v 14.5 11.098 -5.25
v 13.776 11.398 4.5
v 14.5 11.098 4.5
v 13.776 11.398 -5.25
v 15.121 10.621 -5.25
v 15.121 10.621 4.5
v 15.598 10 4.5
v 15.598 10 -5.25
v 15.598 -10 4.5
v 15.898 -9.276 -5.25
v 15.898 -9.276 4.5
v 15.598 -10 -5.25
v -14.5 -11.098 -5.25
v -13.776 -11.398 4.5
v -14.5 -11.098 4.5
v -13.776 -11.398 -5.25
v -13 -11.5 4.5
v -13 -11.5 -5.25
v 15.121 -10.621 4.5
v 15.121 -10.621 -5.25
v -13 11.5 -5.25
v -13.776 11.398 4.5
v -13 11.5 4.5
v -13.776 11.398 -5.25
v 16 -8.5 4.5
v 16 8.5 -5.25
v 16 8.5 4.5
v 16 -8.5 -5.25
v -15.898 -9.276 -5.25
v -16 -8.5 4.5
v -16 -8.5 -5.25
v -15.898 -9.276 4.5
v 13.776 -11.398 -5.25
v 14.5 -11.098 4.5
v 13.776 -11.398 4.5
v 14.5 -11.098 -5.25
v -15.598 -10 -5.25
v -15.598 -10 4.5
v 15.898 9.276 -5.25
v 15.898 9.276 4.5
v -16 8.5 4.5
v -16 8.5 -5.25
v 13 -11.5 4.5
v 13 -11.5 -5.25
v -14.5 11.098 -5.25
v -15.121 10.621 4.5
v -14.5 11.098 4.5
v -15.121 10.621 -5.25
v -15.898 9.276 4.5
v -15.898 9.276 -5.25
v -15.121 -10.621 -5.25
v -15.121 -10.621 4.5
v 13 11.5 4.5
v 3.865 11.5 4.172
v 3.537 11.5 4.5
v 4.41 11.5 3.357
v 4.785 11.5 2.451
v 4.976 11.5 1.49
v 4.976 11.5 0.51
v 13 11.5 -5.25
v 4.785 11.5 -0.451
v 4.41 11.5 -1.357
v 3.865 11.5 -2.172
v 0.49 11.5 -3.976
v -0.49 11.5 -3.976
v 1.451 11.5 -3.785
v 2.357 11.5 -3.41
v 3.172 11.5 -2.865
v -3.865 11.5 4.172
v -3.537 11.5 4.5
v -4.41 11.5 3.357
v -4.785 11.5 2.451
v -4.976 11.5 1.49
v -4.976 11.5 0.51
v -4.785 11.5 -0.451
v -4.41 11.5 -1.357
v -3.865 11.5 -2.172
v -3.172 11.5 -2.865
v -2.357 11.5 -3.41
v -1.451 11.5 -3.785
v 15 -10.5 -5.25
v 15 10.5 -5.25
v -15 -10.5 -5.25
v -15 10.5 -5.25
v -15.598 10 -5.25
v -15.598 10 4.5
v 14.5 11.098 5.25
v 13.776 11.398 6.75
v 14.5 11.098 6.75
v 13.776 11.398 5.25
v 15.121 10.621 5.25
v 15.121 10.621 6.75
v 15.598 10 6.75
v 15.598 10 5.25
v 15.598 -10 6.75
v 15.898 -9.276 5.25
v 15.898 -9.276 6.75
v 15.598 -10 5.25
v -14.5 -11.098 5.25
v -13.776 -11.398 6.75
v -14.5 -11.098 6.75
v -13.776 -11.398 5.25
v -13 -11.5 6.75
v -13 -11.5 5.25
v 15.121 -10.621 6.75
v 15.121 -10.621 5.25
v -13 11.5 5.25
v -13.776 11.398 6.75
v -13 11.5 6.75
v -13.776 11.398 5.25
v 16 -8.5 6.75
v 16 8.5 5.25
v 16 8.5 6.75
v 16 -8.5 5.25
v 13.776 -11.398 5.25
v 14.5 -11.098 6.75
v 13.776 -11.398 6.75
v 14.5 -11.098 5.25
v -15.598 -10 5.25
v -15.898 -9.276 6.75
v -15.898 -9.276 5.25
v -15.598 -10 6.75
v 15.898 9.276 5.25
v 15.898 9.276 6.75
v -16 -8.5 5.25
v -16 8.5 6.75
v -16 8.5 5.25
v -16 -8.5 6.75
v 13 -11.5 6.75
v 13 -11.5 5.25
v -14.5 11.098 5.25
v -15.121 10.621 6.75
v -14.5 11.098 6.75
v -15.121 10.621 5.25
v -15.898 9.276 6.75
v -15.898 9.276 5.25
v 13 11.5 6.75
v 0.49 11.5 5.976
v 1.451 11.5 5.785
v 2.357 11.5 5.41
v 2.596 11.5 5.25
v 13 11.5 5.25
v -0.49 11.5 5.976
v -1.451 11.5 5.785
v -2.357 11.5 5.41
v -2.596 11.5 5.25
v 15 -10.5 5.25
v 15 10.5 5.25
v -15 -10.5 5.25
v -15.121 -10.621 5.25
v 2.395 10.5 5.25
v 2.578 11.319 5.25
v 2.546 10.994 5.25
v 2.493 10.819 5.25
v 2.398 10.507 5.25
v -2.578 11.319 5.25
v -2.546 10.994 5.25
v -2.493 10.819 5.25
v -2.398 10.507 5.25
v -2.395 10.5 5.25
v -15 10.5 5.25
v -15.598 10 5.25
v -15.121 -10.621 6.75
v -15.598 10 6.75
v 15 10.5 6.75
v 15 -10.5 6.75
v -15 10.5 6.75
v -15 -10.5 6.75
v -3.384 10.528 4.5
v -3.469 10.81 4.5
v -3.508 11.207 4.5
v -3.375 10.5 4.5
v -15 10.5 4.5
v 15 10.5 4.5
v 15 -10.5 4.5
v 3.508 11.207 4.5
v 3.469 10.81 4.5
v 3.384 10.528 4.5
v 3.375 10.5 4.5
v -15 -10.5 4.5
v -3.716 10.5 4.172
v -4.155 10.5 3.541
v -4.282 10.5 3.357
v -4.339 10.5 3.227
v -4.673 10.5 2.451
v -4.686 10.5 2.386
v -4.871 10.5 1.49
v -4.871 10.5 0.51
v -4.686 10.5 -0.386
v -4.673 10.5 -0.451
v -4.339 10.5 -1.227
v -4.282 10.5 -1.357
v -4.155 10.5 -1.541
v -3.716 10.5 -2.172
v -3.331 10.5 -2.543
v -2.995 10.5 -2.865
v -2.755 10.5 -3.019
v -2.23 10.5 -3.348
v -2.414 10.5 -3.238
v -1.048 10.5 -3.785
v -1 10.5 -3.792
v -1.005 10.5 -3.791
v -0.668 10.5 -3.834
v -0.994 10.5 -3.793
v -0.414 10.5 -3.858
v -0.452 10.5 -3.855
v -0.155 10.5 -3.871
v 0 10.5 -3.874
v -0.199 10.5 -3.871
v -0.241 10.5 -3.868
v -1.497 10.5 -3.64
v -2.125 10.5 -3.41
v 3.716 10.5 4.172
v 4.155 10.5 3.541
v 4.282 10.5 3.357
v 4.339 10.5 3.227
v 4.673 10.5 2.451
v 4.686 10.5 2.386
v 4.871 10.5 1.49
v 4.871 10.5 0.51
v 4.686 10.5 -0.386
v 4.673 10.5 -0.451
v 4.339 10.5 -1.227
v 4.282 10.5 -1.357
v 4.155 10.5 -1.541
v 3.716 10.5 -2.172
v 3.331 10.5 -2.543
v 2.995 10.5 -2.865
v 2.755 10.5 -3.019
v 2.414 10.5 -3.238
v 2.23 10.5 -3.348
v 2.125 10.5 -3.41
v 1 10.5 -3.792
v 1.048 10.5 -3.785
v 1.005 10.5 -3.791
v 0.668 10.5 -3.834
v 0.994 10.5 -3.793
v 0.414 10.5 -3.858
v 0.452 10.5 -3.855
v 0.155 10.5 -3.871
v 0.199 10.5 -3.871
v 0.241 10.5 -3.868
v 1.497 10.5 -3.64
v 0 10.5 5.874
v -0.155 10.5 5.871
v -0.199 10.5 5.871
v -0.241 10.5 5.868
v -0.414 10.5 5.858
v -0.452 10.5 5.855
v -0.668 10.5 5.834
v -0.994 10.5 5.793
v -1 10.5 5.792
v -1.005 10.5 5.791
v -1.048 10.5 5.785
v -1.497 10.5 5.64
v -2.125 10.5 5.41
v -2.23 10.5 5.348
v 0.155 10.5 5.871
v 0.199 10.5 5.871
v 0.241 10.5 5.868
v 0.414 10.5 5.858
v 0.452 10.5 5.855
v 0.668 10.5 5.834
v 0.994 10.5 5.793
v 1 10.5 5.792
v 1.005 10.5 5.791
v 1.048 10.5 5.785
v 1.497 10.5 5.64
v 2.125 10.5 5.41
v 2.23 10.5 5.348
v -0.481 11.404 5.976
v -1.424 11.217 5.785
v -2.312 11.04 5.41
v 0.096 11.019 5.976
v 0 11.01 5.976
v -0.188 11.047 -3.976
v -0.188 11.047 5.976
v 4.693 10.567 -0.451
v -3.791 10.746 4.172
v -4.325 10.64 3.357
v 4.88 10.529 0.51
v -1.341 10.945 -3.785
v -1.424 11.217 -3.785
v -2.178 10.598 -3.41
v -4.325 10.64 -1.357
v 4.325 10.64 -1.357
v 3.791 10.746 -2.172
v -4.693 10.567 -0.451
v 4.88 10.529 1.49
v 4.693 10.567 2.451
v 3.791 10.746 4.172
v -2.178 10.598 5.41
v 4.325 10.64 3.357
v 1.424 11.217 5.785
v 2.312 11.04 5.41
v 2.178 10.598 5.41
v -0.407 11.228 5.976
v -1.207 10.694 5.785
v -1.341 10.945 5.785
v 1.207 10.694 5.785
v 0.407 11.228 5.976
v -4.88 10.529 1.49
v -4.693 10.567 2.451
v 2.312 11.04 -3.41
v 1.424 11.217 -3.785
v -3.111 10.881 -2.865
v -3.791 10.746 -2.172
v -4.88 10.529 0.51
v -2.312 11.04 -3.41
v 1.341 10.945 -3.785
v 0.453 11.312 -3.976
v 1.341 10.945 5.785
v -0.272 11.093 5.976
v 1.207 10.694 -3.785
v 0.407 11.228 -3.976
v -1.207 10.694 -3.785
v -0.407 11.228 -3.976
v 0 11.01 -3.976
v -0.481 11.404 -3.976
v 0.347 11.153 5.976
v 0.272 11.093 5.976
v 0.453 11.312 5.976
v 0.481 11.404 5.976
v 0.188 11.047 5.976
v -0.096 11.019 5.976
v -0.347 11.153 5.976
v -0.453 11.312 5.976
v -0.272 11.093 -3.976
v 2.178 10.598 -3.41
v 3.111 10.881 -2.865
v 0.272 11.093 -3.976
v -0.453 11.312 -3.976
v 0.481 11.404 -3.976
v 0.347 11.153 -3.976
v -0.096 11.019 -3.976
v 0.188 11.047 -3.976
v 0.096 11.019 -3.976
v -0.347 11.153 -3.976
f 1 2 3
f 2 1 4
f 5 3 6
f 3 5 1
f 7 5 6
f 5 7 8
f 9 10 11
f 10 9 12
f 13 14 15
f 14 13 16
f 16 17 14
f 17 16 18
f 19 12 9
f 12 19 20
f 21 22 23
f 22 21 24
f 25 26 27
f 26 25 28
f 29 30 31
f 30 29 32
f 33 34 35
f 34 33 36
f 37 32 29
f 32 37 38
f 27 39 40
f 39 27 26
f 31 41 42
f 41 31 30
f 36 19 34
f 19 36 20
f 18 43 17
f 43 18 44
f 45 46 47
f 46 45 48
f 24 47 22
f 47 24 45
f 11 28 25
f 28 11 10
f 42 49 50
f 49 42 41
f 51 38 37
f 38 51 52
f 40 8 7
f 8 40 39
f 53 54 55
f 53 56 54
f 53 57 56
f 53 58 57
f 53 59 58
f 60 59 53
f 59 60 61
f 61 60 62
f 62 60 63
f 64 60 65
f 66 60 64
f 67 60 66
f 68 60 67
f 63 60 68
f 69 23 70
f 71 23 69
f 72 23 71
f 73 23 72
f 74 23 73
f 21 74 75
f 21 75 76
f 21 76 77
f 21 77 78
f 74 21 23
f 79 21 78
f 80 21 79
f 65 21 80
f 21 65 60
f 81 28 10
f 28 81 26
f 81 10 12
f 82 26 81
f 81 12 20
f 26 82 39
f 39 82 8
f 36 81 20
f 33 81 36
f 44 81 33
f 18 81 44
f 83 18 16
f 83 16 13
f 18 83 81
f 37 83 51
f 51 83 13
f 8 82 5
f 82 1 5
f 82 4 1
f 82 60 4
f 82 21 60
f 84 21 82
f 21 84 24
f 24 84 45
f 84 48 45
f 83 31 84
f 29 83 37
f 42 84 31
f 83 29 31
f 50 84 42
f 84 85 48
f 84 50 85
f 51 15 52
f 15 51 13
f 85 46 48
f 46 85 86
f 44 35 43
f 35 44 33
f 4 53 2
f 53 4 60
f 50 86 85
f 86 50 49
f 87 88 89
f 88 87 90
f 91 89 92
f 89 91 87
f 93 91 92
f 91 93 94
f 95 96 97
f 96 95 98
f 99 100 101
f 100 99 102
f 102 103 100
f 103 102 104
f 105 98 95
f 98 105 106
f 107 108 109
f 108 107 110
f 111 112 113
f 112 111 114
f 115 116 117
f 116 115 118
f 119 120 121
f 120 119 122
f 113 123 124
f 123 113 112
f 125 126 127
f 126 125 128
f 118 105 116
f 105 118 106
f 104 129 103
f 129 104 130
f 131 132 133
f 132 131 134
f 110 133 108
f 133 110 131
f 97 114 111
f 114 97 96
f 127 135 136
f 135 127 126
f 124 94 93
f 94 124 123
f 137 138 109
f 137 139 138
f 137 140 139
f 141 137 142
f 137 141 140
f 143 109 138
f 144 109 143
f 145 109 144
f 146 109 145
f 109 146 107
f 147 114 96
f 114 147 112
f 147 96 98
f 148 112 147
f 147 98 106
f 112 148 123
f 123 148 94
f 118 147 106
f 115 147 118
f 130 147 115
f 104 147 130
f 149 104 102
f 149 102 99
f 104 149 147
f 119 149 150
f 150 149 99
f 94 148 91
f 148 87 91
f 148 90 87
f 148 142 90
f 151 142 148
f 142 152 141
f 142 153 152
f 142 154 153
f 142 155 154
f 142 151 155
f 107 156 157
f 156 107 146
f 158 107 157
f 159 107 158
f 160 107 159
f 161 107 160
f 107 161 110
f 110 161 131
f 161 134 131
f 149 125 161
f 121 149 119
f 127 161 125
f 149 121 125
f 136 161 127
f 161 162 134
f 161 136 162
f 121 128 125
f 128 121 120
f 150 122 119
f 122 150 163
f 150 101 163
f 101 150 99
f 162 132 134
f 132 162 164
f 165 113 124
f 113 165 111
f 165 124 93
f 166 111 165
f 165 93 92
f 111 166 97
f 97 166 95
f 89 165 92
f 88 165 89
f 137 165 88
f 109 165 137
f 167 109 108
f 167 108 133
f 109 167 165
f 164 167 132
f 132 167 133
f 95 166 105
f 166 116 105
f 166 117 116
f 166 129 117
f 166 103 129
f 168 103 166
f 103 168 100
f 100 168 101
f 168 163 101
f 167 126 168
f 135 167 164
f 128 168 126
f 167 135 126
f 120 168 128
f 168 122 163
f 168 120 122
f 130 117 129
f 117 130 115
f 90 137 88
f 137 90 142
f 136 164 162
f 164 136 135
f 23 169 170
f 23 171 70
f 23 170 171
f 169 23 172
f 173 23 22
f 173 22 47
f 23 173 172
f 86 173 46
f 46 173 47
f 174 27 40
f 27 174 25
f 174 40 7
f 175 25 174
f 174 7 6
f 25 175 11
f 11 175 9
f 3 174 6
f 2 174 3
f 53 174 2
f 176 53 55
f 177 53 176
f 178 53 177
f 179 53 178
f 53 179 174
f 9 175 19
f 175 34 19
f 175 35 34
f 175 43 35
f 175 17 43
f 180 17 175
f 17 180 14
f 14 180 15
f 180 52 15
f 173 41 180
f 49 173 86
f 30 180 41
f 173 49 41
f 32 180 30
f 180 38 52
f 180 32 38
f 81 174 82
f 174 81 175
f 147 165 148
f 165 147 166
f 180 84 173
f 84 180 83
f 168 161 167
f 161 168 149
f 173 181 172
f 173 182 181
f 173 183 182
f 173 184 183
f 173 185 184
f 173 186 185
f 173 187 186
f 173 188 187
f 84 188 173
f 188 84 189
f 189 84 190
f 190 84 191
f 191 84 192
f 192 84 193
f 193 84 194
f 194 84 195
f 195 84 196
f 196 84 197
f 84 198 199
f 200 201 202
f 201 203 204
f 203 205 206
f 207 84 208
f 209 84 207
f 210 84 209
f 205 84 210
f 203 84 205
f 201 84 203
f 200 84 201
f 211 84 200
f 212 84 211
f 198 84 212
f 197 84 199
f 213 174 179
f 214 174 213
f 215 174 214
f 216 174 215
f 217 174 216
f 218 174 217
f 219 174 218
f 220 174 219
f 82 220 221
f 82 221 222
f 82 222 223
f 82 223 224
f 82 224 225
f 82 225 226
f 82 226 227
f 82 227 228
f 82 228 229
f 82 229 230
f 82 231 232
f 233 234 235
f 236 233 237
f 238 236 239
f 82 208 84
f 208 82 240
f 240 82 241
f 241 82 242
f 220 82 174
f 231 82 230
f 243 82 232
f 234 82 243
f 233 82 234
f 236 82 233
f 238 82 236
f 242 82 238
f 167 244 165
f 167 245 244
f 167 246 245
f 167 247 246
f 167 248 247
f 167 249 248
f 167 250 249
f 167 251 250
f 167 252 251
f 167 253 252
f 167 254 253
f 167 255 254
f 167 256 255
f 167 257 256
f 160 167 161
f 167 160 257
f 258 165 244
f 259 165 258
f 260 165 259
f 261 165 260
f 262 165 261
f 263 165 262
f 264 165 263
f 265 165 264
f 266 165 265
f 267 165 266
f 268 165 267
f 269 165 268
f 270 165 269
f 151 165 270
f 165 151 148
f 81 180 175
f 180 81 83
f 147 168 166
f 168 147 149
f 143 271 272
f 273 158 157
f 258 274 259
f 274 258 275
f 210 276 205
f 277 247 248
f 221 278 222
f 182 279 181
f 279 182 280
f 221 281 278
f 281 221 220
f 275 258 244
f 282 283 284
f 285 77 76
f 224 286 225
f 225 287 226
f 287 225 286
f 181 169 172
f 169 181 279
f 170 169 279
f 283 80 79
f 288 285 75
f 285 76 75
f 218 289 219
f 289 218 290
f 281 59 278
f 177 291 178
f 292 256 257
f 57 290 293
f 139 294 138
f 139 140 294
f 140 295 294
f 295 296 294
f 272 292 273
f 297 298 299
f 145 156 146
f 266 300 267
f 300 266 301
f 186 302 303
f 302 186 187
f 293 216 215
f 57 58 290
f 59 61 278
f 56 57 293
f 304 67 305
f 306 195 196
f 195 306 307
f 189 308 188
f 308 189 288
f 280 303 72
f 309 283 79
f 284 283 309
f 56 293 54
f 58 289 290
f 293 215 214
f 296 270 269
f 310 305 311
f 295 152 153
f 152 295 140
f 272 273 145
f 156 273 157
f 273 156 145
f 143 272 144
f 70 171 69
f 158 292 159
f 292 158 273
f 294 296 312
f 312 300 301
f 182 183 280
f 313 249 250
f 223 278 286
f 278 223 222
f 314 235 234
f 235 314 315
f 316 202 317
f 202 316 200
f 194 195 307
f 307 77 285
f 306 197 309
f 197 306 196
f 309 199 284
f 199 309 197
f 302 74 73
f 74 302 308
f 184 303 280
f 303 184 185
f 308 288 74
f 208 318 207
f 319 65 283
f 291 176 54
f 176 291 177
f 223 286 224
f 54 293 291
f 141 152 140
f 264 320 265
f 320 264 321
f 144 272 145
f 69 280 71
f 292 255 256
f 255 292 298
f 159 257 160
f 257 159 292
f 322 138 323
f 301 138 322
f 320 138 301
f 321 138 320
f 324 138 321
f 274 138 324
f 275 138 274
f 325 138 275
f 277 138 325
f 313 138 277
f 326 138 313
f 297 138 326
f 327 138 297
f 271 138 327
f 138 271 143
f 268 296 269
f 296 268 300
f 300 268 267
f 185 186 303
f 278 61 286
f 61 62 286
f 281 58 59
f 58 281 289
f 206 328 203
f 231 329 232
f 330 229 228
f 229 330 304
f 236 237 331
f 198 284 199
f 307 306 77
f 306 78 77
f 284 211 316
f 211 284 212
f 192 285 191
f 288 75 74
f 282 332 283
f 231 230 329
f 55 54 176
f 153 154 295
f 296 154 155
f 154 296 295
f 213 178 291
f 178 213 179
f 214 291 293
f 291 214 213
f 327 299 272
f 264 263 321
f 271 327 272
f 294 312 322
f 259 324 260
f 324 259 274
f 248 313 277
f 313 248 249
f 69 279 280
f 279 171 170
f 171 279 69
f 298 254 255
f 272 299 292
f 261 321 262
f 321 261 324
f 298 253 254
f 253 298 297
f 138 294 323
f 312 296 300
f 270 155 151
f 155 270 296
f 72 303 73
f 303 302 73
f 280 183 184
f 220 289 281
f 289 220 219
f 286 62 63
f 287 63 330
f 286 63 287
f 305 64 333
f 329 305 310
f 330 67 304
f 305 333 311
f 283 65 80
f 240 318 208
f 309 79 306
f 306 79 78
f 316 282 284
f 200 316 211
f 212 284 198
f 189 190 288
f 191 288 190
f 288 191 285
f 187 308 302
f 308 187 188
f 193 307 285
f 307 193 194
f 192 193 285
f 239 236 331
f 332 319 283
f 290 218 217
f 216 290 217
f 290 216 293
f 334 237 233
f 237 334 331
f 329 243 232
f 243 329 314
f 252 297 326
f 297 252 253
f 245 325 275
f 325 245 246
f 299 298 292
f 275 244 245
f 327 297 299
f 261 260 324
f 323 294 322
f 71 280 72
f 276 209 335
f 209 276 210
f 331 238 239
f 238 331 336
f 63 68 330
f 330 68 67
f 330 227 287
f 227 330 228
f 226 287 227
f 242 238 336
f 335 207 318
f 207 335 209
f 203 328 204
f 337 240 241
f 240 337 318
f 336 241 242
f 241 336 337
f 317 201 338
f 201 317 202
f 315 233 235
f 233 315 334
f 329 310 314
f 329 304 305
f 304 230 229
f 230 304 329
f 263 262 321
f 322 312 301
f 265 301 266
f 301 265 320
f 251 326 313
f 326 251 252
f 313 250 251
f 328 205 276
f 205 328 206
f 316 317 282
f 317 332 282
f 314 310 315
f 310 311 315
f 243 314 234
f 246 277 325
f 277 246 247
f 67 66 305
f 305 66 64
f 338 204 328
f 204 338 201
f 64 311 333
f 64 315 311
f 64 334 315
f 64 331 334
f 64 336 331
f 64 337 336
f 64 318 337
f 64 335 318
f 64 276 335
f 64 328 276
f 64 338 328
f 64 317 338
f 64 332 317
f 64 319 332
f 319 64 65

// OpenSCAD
// file: parameters.scad
// SmartPaddle — Parametric Enclosure Parameters
// All dimensions in millimeters

// === Handle (Butterfly Timo Boll ALC FL: 100×25×34 mm) ===
handle_length = 100;
handle_neck_w = 24;       // width at blade junction
handle_butt_w = 34;       // width at butt (FL flare)
handle_thickness = 25;    // front-back thickness
handle_corner_r = 3;      // cross-section corner radius
// Legacy aliases used by battery cover / jig
handle_width = handle_butt_w;
handle_height = handle_thickness;
wall_thickness = 2.0;

// === Internal Cavities ===
pcb_cavity_w = 29;    // PCB is 28mm wide, +0.5mm clearance each side
pcb_cavity_h = 8;     // Board + components height
pcb_cavity_l = 85;    // PCB is 85mm long
pcb_y_offset = -3;    // PCB cavity vertical offset from handle center

battery_cavity_w = 21;
battery_cavity_h = 6;
battery_cavity_l = 40;
battery_y_offset = pcb_y_offset + pcb_cavity_h/2 + battery_cavity_h/2 + 1; // Below PCB

// === USB-C cutout ===
usb_cutout_w = 9;
usb_cutout_h = 3.5;
usb_cutout_z = 2;     // Height from handle back face

// === Mounting bosses ===
boss_diameter = 4.2;  // M2 clearance hole
boss_height = 5;
boss_wall = 2;

// === Ventilation ===
vent_slot_w = 1.5;
vent_slot_l = 15;
vent_count = 3;

// === Blade junction ===
blade_neck_w = 24;    // FL neck width where handle meets blade
blade_neck_l = 15;    // Length of neck section
blade_neck_h = 6;     // Neck thickness

// === Battery Cover ===
cover_tolerance = 0.2; // Snap-fit clearance
cover_lip_h = 1.5;     // Lip height for snap fit
cover_lip_w = 1.0;     // Lip width
cover_fingernail_r = 5; // Fingernail opening radius

// === Battery ===
battery_w = 20;
battery_h = 5;
battery_l = 35;

// === Hex grip pattern ===
hex_size = 4;
hex_depth = 0.5;
hex_spacing = 6;
// main file
// SmartPaddle Battery Cover — snap-fit at FL handle butt
// Prints flat on build plate, Bambu X1C, PLA, 0.16mm layers

include <parameters.scad>

module rounded_rect_2d(w, h, r) {
    rr = min(r, w / 2 - 0.1, h / 2 - 0.1);
    minkowski() {
        square([w - 2 * rr, h - 2 * rr], center = true);
        circle(r = rr, $fn = 24);
    }
}

module battery_cover() {
    cover_h = battery_cavity_h + wall_thickness * 1.5;
    cover_w = handle_butt_w - wall_thickness * 2;
    cover_t = handle_thickness - wall_thickness * 2;

    difference() {
        union() {
            linear_extrude(height = cover_h, center = true, convexity = 4)
                rounded_rect_2d(cover_w + cover_lip_w * 2, cover_t + cover_lip_w * 2, handle_corner_r);

            // Snap-fit lips
            for (z = [-1, 1]) {
                translate([0, 0, z * (cover_h / 2 + cover_lip_h / 2)])
                    linear_extrude(height = cover_lip_h, convexity = 4)
                        rounded_rect_2d(cover_w + cover_lip_w * 2, cover_t + cover_lip_w * 2, handle_corner_r);
            }
        }

        // Hollow interior
        translate([0, 0, 0])
            cube([cover_w, cover_t, handle_length], center = true);

        // Fingernail groove for opening
        translate([0, cover_t / 2 + 1, wall_thickness / 2])
            sphere(r = cover_fingernail_r, $fn = 32);

        // Ventilation slots match handle
        for (i = [0:vent_count - 1]) {
            translate([0, 0, -battery_cavity_l / 4 + i * 6])
                cube([vent_slot_w, 15, vent_slot_l], center = true);
        }
    }
}

battery_cover();
